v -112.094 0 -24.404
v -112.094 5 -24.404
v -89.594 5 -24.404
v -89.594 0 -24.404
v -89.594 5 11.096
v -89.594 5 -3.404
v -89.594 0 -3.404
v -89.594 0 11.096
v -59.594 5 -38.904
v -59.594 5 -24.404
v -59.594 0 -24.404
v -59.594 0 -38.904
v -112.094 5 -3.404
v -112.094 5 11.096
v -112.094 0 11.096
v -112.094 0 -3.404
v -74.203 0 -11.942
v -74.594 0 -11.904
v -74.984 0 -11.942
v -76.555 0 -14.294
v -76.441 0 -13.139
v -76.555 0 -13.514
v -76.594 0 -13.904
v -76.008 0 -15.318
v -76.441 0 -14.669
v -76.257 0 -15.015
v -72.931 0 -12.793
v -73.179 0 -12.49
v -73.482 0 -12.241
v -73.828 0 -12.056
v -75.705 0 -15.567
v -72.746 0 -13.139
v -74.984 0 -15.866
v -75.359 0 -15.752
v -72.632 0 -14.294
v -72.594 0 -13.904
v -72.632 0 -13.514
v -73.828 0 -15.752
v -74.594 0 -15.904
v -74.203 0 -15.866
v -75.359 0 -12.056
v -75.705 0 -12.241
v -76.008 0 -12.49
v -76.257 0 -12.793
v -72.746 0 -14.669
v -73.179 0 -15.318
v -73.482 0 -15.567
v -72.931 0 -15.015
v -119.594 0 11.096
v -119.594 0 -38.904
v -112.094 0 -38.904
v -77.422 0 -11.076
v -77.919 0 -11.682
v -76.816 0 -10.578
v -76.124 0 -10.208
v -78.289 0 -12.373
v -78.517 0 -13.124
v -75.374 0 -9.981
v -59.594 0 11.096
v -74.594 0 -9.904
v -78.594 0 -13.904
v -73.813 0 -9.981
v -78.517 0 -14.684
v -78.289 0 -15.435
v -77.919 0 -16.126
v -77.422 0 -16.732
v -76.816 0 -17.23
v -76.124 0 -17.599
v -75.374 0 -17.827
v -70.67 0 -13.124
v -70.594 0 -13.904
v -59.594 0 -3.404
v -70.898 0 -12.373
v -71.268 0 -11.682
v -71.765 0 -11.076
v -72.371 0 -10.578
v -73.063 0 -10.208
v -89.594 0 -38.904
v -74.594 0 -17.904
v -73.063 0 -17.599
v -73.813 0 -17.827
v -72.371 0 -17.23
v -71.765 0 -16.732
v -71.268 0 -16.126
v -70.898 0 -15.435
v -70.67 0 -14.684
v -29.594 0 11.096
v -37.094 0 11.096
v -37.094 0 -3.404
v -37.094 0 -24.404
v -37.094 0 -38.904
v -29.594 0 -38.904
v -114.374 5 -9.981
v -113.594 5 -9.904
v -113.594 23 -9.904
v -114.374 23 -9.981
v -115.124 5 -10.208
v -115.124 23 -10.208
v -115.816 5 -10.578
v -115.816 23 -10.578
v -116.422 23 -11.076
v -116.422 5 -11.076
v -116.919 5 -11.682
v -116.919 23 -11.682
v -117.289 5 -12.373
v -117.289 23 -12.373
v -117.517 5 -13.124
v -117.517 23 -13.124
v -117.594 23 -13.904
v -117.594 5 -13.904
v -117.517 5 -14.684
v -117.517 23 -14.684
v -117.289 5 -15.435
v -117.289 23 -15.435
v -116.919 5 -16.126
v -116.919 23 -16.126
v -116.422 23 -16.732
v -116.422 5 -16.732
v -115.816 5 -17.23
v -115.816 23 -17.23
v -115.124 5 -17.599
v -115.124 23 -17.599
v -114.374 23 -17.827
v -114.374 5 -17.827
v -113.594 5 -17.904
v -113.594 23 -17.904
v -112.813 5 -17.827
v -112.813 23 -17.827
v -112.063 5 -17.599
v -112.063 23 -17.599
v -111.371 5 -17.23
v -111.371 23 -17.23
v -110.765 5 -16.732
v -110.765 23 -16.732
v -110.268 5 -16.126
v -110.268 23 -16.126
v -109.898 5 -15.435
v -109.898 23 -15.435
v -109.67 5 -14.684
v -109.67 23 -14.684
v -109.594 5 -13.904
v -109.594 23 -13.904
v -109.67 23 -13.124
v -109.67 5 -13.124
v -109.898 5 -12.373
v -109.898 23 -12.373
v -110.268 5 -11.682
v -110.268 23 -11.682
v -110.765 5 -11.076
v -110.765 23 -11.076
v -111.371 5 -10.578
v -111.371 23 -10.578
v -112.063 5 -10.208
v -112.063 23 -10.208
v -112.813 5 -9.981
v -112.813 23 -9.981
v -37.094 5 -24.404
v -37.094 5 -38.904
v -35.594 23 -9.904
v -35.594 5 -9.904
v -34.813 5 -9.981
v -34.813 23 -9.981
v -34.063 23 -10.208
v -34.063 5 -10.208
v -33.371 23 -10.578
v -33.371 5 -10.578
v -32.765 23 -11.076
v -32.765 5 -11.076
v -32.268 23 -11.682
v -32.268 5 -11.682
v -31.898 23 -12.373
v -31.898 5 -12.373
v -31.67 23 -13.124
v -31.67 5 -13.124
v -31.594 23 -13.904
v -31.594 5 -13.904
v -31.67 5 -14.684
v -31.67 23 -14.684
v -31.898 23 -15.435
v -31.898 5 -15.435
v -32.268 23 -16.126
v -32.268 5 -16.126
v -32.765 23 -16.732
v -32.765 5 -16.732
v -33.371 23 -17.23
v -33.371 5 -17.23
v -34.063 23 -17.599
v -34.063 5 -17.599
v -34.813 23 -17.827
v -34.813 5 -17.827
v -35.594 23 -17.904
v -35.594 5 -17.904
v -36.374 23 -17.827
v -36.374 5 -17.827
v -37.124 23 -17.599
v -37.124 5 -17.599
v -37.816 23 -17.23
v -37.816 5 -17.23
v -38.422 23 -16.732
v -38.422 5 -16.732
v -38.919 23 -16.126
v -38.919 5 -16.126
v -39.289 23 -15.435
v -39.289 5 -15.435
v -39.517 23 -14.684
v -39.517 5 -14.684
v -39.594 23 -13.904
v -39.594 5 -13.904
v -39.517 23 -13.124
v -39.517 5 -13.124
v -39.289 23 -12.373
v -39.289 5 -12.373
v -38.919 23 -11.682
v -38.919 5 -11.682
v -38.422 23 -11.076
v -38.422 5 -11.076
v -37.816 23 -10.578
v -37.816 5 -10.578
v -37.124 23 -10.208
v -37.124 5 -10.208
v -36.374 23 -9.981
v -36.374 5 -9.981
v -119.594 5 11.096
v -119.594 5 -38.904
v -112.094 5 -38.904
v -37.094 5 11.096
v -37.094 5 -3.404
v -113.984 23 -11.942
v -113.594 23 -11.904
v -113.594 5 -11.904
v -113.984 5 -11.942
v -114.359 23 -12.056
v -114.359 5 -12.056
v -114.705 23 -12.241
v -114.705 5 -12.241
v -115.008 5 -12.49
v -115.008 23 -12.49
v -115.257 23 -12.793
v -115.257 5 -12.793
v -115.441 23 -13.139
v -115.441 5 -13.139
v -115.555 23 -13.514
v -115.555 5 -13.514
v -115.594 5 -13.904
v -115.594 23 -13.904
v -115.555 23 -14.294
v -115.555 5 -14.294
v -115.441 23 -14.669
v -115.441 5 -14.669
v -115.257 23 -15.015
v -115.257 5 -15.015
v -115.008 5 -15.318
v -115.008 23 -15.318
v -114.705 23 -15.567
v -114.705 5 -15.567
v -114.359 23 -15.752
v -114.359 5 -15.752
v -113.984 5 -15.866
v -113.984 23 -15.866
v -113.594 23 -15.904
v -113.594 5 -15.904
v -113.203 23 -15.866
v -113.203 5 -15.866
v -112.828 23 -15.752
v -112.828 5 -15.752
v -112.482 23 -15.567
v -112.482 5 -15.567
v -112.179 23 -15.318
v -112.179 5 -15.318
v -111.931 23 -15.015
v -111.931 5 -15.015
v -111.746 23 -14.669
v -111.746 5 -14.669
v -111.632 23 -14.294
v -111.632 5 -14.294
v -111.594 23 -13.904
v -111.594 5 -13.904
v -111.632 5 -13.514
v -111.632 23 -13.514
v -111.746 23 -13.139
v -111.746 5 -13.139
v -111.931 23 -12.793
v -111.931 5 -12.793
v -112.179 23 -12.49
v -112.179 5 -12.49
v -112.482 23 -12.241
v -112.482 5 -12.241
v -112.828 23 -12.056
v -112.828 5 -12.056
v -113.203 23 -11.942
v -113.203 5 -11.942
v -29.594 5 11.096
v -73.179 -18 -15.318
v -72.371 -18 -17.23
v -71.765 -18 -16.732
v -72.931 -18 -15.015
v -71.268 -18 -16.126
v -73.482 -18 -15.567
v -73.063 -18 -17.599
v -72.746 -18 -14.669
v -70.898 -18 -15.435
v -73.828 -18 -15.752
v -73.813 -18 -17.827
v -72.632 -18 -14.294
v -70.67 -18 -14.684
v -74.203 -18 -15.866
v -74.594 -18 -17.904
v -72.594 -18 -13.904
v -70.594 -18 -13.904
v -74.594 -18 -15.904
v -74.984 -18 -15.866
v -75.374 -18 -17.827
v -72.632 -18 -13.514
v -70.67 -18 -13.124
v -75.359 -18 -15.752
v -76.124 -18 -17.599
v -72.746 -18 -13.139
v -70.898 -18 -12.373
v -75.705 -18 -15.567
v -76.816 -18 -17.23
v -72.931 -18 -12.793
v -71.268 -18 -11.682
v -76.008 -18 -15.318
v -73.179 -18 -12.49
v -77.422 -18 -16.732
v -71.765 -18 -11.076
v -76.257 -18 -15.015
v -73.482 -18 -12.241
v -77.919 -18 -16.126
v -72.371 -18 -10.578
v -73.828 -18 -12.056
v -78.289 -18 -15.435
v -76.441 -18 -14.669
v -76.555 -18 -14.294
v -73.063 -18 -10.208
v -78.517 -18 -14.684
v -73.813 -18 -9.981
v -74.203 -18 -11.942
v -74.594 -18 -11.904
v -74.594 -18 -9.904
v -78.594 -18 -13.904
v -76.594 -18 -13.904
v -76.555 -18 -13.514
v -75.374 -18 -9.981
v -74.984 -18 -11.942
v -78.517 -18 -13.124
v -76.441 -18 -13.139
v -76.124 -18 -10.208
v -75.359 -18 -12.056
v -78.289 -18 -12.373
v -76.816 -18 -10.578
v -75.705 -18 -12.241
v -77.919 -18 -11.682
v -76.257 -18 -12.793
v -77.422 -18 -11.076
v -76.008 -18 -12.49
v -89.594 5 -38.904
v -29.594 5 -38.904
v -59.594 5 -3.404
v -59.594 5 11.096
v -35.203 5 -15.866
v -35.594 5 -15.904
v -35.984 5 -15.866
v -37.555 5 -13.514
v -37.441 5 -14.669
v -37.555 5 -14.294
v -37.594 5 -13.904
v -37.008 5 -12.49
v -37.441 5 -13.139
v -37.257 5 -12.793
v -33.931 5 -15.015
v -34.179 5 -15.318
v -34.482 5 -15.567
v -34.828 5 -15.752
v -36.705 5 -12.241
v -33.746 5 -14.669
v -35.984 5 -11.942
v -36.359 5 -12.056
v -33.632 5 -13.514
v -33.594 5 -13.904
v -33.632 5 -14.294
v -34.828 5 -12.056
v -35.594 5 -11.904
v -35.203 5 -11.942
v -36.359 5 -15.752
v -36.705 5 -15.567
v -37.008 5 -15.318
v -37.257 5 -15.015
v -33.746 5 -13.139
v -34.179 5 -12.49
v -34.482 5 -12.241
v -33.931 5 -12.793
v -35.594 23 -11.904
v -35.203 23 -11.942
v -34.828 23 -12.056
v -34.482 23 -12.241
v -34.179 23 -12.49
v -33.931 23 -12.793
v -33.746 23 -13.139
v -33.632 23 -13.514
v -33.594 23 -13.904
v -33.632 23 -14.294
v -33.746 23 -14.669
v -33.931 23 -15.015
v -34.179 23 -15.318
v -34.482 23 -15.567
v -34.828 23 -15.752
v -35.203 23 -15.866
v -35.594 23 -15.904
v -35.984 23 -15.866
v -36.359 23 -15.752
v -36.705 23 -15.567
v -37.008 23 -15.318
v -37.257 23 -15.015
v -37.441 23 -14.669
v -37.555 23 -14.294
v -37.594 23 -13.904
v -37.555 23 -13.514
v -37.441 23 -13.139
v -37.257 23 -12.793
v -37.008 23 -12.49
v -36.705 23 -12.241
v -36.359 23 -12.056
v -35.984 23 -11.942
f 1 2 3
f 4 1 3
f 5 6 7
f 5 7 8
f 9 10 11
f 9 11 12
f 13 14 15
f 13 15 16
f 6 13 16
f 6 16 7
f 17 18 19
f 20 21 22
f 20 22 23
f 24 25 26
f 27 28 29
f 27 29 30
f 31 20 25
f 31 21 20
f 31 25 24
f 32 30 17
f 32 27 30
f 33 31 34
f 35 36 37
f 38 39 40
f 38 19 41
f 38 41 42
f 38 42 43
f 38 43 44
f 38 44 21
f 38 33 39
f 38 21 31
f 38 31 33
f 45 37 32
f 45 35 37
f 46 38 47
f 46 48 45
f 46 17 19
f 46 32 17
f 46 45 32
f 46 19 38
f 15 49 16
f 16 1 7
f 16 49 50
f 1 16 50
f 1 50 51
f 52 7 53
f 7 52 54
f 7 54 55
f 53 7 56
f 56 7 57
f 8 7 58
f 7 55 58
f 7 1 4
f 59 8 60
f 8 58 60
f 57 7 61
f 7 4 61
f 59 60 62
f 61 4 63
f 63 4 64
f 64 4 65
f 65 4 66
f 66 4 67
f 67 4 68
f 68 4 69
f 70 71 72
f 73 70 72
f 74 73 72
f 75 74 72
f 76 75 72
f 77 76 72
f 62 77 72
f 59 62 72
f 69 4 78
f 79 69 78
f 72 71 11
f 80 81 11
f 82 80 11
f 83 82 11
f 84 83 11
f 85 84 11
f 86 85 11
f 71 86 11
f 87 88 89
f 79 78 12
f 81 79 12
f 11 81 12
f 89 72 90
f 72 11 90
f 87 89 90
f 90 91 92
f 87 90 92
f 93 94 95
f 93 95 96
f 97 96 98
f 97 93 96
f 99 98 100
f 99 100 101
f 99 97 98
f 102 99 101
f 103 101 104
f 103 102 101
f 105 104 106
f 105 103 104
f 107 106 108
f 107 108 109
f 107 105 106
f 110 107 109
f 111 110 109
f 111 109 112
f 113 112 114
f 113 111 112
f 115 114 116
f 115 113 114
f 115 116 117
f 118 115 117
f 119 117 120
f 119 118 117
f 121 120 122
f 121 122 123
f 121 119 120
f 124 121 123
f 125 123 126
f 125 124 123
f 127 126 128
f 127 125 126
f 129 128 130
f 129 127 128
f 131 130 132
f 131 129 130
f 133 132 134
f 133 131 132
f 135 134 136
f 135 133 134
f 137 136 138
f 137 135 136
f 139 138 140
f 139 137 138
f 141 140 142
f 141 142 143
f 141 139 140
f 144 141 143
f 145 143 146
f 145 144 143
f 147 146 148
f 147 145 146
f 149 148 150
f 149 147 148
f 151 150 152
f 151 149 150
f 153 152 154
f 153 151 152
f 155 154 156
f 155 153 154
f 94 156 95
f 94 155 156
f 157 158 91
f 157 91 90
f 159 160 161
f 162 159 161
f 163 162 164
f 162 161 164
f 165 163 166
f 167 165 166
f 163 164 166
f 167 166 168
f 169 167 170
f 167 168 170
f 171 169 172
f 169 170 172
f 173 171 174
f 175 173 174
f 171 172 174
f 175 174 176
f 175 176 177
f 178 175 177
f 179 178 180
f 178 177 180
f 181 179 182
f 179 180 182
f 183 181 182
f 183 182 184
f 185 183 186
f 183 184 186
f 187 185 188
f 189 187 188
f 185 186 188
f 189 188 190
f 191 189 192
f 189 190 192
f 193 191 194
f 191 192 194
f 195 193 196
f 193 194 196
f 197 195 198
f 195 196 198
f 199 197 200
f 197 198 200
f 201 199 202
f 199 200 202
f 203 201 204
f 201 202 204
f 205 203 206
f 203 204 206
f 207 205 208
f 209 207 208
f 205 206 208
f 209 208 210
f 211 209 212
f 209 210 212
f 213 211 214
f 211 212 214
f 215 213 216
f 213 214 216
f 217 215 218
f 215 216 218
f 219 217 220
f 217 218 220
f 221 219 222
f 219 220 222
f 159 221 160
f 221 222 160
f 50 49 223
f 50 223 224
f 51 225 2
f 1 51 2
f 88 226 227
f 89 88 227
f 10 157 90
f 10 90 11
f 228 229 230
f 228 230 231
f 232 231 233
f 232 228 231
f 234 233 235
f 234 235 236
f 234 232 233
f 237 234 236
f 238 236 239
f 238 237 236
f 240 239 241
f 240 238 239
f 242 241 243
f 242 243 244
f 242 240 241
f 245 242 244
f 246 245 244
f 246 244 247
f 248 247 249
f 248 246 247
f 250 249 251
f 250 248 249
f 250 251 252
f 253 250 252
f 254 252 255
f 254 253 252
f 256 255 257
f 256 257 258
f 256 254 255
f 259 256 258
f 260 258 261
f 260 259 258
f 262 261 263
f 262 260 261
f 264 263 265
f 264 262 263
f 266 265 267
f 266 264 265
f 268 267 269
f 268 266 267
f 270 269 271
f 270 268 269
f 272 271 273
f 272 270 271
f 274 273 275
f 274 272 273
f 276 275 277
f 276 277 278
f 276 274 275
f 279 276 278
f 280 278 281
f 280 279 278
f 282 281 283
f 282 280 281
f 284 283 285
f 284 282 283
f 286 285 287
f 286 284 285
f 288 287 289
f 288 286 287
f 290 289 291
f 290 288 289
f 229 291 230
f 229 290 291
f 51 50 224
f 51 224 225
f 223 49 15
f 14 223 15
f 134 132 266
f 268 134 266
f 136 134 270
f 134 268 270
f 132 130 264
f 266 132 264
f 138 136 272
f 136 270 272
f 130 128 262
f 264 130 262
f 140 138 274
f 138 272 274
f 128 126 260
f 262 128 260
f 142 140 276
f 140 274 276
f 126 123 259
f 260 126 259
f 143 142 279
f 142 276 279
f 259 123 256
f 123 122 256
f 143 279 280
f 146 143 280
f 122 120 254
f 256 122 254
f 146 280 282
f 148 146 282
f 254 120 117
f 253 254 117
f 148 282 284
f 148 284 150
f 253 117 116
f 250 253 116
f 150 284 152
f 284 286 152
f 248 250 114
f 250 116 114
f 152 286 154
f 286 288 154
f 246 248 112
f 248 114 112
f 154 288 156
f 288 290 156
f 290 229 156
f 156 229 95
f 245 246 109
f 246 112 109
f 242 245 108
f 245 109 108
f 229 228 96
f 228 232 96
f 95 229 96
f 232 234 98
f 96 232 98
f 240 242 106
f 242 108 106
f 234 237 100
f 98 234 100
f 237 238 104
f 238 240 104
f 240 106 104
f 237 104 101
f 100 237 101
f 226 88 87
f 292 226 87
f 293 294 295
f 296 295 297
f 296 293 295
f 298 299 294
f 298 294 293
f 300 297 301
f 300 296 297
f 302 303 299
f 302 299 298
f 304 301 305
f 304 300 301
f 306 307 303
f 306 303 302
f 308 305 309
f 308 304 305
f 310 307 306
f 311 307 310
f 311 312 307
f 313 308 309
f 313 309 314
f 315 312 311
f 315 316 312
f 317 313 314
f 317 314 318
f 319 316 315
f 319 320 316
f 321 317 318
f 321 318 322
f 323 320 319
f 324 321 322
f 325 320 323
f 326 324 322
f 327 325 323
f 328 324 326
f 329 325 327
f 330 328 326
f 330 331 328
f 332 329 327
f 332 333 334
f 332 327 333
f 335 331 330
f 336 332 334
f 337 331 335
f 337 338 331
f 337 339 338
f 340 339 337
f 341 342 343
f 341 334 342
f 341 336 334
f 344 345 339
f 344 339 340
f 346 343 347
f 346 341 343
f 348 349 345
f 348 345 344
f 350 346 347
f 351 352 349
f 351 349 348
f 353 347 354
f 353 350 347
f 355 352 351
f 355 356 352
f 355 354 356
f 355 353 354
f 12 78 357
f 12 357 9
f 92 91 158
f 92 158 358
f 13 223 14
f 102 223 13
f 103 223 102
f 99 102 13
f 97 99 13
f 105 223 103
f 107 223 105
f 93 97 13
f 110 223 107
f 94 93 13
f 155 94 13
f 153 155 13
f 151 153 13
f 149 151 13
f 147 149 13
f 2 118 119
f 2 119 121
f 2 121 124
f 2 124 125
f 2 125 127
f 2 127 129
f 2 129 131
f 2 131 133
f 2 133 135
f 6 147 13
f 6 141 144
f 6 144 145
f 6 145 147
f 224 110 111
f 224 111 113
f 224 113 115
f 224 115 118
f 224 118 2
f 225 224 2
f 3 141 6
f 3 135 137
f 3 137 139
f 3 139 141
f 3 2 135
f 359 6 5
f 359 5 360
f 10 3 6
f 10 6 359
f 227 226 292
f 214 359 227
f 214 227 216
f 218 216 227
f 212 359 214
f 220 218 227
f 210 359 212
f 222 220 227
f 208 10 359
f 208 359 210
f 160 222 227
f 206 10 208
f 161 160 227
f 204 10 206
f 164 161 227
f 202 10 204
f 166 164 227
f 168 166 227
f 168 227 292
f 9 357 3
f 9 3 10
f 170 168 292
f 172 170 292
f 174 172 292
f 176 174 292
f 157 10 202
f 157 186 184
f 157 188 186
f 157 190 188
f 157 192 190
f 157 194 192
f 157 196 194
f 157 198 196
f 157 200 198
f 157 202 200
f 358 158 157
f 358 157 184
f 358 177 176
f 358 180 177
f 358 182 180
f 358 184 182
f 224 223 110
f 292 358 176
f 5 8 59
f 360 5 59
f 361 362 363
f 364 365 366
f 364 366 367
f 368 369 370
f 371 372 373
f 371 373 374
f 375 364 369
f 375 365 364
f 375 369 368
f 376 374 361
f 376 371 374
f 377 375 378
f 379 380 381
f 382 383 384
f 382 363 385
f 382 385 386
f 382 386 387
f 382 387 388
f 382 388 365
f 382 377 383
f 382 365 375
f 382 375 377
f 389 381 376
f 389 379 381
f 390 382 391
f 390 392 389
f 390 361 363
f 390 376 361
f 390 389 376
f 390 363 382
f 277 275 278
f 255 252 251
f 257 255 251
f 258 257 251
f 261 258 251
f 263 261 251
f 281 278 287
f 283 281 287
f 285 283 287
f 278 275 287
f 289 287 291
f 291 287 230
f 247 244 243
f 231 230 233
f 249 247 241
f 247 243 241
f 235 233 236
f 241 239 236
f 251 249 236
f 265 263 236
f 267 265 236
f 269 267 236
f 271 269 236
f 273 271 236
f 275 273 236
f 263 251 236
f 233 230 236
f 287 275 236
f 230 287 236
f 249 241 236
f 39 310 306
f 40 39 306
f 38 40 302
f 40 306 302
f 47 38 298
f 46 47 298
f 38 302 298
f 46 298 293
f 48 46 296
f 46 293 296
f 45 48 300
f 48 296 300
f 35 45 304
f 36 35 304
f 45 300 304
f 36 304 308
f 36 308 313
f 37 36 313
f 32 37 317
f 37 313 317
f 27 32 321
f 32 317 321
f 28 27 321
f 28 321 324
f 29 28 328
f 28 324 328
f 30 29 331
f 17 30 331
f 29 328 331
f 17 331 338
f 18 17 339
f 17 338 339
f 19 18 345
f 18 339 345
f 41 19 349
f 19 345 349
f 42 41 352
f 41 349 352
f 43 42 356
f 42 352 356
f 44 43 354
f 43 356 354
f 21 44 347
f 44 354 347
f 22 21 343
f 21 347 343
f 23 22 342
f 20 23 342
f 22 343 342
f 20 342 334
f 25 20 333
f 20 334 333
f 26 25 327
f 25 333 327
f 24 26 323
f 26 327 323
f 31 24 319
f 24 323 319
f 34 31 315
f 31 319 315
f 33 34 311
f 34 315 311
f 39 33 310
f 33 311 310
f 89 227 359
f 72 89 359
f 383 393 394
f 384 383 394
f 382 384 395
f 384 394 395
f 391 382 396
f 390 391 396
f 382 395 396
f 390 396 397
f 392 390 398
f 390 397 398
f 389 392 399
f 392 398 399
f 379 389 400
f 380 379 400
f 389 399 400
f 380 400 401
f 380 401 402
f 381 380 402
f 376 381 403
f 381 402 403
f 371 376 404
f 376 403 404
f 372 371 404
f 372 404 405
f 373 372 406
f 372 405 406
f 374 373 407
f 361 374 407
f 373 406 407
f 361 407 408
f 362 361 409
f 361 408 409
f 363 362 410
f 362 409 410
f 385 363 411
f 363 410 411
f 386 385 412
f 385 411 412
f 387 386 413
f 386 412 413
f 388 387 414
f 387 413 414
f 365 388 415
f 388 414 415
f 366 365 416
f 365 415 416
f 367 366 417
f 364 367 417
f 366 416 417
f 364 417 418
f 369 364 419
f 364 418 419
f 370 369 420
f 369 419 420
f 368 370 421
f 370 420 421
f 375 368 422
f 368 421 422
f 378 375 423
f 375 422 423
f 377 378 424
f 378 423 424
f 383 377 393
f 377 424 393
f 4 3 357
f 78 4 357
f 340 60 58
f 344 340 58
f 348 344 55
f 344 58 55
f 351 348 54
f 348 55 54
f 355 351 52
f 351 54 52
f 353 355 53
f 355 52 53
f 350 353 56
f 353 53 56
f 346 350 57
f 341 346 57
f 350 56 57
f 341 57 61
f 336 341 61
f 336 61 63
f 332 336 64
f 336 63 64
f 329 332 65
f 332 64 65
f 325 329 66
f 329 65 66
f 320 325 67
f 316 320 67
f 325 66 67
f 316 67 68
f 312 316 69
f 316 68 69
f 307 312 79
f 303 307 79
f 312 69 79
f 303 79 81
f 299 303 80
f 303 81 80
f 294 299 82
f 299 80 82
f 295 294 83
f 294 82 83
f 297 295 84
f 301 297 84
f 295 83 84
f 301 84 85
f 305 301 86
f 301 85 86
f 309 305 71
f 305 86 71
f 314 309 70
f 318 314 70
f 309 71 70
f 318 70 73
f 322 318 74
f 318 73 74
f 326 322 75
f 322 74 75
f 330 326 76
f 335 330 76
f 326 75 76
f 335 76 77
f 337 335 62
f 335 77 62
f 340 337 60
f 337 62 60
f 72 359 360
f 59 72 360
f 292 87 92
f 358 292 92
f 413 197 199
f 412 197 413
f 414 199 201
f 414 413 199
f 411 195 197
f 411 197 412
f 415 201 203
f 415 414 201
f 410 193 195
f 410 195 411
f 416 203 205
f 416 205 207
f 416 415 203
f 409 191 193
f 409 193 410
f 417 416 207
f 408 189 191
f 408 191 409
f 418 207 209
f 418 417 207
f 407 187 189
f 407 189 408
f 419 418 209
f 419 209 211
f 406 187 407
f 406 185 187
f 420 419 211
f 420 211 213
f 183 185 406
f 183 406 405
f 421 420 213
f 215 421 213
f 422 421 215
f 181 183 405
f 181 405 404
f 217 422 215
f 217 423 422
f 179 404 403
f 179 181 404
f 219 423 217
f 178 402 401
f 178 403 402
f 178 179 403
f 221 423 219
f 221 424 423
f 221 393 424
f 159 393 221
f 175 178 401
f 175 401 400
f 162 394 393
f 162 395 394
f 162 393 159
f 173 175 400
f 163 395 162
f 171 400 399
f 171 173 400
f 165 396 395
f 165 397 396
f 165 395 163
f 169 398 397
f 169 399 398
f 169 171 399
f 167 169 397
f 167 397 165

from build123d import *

# Parameters (mm, degrees)
SKETCH3_W            = 90
SKETCH3_H            = 50
BOSS_EXTRUDE1_DEPTH  = 5
CUT_EXTRUDE1_DEPTH   = 5
MIRROR2_COPY_1_DEPTH = 5
SKETCH5_R            = 4
BOSS_EXTRUDE2_DEPTH  = 18
SKETCH6_R            = 2
CUT_EXTRUDE2_DEPTH   = 18
SKETCH8_R            = 4
BOSS_EXTRUDE3_DEPTH  = 18
SKETCH9_R            = 2
CUT_EXTRUDE3_DEPTH   = 18


with BuildPart() as part:
    # Sketch3 → Boss-Extrude1 (new body)
    with BuildSketch(Plane(origin=(0, 0, 0), x_dir=(1, 0, 0), z_dir=(0, 1, 0))):
        with Locations((-74.593596059, 13.903940887)):
            Rectangle(SKETCH3_W, SKETCH3_H)
    extrude(amount=BOSS_EXTRUDE1_DEPTH)

    # Sketch4 → Cut-Extrude1 (cut)
    with BuildSketch(Plane(origin=(0, 5, 0), x_dir=(1, 0, 0), z_dir=(0, 1, 0))):
        Polygon((-90.093596059, 24.403940887), (-89.593596059, 24.403940887), (-89.593596059, 38.903940887), (-112.093596059, 38.903940887), (-112.093596059, 24.403940887), align=None)
    cut_extrude1 = extrude(amount=-CUT_EXTRUDE1_DEPTH, mode=Mode.SUBTRACT)

    # Mirror1: Cut-Extrude1 across plane
    add(cut_extrude1.mirror(Plane.XY.offset(-13.903940887)), mode=Mode.SUBTRACT)

    # Mirror2: Cut-Extrude1 across plane
    add(cut_extrude1.mirror(Plane.ZY.offset(74.593596059)), mode=Mode.SUBTRACT)

    # Mirror2 copy 1 sketch → Mirror2 copy 1 (cut)
    with BuildSketch(Plane(origin=(-149.187192118, 5, -27.807881773), x_dir=(-1, 0, 0), z_dir=(0, 1, 0))):
        Polygon((-90.093596059, 24.403940887), (-89.593596059, 24.403940887), (-89.593596059, 38.903940887), (-112.093596059, 38.903940887), (-112.093596059, 24.403940887), align=None)
    extrude(amount=-MIRROR2_COPY_1_DEPTH, mode=Mode.SUBTRACT)

    # Sketch5 → Boss-Extrude2 (add)
    with BuildSketch(Plane(origin=(0, 5, 0), x_dir=(1, 0, 0), z_dir=(0, 1, 0))):
        with Locations(Location((-35.593596059, 13.903940887, 0), (0, 0, 270))):
            Circle(SKETCH5_R)
    boss_extrude2 = extrude(amount=BOSS_EXTRUDE2_DEPTH)

    # Sketch6 → Cut-Extrude2 (cut)
    with BuildSketch(Plane(origin=(0, 23, 0), x_dir=(1, 0, 0), z_dir=(0, 1, 0))):
        with Locations(Location((-35.593596059, 13.903940887, 0), (0, 0, 270))):
            Circle(SKETCH6_R)
    cut_extrude2 = extrude(amount=-CUT_EXTRUDE2_DEPTH, mode=Mode.SUBTRACT)

    # Mirror4: Boss-Extrude2, Cut-Extrude2 across plane
    add(boss_extrude2.mirror(Plane.ZY.offset(74.593596059)))
    add(cut_extrude2.mirror(Plane.ZY.offset(74.593596059)), mode=Mode.SUBTRACT)

    # Sketch8 → Boss-Extrude3 (add)
    with BuildSketch(Plane(origin=(0, 0, 0), x_dir=(-1, 0, 0), z_dir=(0, -1, 0))):
        with Locations(Location((74.593596059, 13.903940887, 0), (0, 0, 270))):
            Circle(SKETCH8_R)
    extrude(amount=BOSS_EXTRUDE3_DEPTH)

    # Sketch9 → Cut-Extrude3 (cut)
    with BuildSketch(Plane(origin=(0, -18, 0), x_dir=(-1, 0, 0), z_dir=(0, -1, 0))):
        with Locations(Location((74.593596059, 13.903940887, 0), (0, 0, 90))):
            Circle(SKETCH9_R)
    extrude(amount=-CUT_EXTRUDE3_DEPTH, mode=Mode.SUBTRACT)


solid = part.part
